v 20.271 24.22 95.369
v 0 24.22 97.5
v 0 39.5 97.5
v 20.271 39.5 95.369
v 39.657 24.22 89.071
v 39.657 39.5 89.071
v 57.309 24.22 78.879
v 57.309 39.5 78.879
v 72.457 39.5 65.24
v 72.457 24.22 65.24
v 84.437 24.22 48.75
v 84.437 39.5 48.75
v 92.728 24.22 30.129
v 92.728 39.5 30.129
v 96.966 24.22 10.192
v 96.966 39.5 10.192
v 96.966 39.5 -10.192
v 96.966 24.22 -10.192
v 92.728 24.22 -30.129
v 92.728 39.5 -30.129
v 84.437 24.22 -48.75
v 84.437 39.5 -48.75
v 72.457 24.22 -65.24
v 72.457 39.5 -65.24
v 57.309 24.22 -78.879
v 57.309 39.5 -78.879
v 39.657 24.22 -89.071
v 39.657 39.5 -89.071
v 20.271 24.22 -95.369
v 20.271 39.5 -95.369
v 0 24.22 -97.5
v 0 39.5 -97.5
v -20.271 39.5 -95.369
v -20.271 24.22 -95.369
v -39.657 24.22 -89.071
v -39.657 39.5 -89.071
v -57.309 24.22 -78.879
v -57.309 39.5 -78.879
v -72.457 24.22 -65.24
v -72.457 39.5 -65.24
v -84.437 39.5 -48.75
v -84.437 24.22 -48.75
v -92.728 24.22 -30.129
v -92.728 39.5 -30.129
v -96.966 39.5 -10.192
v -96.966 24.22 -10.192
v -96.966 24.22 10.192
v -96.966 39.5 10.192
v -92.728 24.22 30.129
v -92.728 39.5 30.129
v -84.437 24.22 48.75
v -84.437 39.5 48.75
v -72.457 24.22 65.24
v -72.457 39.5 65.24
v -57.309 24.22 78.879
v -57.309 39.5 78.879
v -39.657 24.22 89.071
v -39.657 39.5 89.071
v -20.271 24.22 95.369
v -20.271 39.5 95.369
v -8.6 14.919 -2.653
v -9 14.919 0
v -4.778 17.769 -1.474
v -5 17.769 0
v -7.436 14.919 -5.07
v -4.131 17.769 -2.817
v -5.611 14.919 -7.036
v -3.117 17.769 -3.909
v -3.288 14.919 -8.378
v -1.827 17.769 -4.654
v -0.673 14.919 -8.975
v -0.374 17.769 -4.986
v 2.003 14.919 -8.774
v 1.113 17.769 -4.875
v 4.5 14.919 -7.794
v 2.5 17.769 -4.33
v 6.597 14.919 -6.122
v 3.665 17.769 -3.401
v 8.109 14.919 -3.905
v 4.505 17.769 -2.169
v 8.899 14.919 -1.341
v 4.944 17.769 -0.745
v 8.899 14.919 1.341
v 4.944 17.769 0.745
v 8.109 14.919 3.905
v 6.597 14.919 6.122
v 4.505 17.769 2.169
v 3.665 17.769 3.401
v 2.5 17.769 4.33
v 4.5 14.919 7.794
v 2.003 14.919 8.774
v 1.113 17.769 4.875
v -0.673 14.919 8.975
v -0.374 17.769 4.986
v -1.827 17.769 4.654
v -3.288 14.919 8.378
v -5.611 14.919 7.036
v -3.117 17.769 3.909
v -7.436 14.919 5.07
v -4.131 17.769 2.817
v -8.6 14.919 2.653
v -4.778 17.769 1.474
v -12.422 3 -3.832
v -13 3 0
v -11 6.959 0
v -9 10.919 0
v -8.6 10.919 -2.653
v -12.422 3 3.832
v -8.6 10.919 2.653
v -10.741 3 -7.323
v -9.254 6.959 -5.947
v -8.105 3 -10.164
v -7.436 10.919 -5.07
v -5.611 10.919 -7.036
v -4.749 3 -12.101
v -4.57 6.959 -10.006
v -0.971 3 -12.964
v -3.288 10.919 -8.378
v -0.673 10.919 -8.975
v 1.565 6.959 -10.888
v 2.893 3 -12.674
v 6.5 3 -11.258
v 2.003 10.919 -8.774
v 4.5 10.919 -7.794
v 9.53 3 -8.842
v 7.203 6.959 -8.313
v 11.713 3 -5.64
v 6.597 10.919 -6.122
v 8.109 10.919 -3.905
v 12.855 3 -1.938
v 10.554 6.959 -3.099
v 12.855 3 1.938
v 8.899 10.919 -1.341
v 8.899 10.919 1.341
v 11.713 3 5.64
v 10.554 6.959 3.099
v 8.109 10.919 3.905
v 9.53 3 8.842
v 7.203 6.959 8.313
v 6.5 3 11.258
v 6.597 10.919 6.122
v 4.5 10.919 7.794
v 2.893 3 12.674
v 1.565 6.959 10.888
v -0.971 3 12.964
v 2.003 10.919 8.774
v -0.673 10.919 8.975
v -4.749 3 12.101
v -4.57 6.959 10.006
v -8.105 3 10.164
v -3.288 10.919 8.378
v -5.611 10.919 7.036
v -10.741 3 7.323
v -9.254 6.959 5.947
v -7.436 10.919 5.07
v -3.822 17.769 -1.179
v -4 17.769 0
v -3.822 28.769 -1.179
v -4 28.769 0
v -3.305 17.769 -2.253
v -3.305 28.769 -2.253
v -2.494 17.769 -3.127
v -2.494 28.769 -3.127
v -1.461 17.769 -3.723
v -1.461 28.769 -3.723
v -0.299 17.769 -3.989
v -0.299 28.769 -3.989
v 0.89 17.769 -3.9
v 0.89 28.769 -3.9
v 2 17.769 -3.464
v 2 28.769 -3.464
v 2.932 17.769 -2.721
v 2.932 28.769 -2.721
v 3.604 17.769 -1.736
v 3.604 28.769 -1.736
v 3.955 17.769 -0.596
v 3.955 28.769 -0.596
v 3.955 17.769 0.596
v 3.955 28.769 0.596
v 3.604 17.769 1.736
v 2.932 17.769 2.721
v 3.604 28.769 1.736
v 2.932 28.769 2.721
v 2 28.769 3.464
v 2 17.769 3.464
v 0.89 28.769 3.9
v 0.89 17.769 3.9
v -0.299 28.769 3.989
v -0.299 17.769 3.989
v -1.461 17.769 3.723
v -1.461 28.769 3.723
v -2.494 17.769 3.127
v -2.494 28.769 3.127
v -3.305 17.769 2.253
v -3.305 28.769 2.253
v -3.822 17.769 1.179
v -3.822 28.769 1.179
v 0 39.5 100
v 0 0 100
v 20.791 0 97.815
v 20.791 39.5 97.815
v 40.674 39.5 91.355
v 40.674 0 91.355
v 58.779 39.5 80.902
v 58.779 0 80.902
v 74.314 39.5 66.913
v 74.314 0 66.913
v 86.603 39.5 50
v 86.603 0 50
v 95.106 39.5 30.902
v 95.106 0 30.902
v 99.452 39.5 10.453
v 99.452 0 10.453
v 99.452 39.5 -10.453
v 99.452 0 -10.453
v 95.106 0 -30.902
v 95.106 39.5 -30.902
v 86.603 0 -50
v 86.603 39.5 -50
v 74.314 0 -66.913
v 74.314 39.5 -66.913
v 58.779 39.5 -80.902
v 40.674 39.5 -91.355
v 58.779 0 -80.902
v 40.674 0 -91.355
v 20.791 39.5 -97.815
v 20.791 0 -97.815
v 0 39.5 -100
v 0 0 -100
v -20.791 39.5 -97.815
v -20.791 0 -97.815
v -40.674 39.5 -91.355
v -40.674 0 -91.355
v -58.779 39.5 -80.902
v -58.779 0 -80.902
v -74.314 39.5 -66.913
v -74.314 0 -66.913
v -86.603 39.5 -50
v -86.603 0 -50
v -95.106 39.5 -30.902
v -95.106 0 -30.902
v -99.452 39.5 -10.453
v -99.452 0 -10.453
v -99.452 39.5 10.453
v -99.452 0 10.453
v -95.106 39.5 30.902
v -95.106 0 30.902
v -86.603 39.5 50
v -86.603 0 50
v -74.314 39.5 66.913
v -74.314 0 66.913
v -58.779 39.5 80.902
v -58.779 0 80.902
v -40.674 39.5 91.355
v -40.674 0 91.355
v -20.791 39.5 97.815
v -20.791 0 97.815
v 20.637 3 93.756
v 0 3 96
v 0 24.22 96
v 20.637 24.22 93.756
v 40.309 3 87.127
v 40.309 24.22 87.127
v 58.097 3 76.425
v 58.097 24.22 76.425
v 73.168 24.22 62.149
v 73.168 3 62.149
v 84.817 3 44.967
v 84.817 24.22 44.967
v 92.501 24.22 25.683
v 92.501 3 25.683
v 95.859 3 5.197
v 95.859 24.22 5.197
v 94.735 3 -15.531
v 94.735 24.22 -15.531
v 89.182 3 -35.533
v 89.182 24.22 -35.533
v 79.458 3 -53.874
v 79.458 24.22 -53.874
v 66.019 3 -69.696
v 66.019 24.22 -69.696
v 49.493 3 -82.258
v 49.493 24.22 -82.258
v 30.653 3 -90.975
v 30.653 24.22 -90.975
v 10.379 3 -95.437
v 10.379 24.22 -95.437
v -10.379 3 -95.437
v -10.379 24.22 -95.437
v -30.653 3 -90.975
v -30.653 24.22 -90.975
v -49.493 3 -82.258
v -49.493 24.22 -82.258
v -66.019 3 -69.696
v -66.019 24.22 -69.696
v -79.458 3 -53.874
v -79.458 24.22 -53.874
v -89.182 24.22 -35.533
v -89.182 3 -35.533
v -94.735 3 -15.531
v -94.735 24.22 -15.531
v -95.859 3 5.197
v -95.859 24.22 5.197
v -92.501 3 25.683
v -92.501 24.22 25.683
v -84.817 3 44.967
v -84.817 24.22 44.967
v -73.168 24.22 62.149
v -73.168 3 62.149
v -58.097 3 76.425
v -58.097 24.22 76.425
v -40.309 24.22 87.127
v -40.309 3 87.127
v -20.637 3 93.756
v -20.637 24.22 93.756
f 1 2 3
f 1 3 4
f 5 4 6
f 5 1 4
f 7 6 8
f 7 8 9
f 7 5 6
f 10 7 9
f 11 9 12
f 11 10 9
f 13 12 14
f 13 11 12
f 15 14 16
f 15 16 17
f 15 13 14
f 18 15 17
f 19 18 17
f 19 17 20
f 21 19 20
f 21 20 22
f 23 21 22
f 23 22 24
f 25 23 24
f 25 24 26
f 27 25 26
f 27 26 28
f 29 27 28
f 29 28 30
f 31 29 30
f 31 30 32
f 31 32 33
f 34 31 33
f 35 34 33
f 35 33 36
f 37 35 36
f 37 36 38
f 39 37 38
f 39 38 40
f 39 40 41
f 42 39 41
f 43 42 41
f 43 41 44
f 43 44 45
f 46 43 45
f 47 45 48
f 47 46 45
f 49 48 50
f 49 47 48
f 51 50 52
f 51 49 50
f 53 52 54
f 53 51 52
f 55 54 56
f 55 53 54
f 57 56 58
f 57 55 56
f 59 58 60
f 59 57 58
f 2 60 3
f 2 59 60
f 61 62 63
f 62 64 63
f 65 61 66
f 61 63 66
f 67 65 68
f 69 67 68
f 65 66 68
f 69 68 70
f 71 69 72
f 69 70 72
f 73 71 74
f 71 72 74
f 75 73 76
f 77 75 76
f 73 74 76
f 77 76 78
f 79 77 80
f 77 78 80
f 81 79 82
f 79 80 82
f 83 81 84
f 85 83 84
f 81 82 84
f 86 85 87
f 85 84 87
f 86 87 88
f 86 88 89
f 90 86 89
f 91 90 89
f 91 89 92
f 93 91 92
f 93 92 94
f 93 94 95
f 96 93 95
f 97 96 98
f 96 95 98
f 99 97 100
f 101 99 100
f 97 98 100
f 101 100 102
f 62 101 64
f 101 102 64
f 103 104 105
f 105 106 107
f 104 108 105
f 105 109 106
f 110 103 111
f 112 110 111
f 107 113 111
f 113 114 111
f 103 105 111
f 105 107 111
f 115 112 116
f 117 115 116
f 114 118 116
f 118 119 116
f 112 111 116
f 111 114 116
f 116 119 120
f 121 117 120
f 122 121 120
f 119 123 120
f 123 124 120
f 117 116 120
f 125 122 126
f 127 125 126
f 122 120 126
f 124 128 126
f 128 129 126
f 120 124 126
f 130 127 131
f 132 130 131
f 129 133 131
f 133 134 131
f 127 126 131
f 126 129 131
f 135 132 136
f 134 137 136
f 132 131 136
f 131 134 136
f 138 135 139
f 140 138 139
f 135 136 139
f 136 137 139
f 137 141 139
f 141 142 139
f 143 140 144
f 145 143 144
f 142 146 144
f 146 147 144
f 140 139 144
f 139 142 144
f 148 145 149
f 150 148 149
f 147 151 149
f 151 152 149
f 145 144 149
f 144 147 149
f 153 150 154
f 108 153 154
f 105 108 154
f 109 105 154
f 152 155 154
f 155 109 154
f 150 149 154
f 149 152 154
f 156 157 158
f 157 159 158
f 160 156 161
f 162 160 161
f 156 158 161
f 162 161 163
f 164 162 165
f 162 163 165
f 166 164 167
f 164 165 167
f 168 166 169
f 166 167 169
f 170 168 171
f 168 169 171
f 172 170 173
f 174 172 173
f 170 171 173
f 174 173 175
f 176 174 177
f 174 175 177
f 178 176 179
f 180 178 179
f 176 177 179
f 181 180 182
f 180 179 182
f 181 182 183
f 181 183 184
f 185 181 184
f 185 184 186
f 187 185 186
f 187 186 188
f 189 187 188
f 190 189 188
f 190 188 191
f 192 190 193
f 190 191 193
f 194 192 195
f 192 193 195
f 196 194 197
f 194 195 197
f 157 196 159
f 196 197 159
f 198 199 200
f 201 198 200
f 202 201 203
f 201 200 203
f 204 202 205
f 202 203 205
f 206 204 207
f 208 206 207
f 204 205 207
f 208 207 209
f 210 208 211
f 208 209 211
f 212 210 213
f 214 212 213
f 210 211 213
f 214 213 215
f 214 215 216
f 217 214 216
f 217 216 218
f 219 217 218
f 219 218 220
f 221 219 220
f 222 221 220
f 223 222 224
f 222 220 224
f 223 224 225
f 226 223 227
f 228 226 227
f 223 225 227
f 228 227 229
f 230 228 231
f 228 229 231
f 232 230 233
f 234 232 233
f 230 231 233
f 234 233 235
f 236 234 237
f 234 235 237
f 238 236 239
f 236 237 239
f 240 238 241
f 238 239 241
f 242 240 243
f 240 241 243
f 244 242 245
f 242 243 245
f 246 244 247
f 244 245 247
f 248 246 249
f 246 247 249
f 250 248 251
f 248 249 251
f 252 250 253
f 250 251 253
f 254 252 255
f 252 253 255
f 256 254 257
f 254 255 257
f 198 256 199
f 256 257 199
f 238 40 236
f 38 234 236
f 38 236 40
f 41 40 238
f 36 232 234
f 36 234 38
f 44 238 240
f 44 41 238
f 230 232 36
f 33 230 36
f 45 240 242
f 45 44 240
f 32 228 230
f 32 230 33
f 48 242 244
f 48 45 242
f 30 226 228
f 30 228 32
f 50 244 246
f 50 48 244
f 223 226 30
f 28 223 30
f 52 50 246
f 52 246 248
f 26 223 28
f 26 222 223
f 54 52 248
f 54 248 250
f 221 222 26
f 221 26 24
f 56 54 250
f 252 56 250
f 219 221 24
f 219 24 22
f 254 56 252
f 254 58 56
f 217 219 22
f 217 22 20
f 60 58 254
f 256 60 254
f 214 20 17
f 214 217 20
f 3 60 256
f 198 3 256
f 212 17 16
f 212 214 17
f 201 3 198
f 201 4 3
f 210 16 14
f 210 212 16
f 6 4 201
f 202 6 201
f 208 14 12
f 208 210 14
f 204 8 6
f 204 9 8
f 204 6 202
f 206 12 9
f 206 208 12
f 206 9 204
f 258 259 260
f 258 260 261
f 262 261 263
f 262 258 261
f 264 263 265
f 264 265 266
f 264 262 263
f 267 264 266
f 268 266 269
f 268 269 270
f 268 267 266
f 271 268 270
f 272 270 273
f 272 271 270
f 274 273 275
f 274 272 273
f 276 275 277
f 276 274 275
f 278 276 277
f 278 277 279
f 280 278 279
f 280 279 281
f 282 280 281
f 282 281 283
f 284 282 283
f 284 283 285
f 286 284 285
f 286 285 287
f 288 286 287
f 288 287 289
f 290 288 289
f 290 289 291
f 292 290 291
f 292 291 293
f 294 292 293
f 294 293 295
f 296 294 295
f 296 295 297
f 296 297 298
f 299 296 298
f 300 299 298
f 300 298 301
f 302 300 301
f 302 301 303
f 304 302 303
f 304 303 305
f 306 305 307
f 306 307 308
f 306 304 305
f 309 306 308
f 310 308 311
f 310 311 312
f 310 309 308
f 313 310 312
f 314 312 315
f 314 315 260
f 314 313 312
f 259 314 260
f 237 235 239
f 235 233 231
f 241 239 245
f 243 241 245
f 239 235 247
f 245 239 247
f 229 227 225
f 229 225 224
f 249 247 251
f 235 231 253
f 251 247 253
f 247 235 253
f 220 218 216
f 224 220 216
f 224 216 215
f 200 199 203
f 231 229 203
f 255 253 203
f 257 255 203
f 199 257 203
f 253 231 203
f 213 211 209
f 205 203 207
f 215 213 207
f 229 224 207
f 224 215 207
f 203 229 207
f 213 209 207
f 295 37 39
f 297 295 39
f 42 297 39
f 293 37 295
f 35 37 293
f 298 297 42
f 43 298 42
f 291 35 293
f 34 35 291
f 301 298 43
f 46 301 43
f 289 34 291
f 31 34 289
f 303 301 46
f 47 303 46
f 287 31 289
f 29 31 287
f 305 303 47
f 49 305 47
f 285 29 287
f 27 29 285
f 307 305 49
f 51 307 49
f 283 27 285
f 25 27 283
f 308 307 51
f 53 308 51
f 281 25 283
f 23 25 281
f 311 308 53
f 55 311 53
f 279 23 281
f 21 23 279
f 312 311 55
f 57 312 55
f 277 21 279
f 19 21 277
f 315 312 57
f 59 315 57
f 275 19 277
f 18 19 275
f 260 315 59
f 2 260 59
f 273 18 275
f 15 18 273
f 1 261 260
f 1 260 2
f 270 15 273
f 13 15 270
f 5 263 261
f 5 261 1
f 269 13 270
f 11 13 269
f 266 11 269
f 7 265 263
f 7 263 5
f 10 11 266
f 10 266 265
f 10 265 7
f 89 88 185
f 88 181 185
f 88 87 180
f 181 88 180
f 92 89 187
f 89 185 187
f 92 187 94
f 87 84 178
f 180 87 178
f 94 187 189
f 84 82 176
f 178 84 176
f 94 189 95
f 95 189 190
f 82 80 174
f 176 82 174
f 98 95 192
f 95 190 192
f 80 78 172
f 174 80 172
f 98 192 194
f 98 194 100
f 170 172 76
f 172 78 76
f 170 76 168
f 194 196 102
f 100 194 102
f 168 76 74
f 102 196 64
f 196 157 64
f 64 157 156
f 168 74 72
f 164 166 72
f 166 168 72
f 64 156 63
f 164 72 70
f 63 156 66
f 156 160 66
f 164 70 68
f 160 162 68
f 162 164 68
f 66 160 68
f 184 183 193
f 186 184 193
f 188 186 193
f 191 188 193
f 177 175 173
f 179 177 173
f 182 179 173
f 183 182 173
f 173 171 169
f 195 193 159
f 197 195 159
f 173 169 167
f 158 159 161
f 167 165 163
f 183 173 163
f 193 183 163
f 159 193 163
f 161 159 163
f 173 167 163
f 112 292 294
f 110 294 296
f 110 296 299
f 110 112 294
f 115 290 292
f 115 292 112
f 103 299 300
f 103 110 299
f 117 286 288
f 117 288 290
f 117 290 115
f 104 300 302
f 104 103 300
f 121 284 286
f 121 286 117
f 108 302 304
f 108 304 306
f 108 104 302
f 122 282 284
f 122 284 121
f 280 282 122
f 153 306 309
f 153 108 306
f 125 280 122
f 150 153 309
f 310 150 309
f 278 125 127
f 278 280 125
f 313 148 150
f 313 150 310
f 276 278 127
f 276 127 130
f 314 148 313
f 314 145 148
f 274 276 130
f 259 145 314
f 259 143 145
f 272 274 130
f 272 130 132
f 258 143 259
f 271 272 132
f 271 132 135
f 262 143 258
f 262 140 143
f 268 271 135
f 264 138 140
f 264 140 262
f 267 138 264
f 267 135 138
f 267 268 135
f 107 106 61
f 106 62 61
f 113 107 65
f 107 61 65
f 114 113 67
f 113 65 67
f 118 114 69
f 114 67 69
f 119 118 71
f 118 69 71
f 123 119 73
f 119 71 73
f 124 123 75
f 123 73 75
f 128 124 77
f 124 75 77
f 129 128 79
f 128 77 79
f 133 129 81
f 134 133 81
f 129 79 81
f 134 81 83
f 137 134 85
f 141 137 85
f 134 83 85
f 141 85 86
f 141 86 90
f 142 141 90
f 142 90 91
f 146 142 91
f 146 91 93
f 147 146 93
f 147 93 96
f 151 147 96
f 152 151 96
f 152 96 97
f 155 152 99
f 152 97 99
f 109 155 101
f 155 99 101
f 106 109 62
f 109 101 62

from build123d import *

# Parameters (mm, degrees)
SKETCH1_R           = 96
BOSS_EXTRUDE1_DEPTH = 3
SKETCH1_4_R         = 97.5
SKETCH1_4_R_2       = 96
BOSS_EXTRUDE2_DEPTH = 24.22
SKETCH1_5_R         = 100
SKETCH1_5_R_2       = 97.5
BOSS_EXTRUDE3_DEPTH = 39.5


with BuildPart() as part:
    # Sketch1 → Boss-Extrude1 (new body)
    with BuildSketch(Plane(origin=(0, 0, 0), x_dir=(1, 0, 0), z_dir=(0, 1, 0))):
        Circle(SKETCH1_R)
    extrude(amount=BOSS_EXTRUDE1_DEPTH)

    # Sketch1<4> → Boss-Extrude2 (add)
    with BuildSketch(Plane(origin=(0, 0, 0), x_dir=(1, 0, 0), z_dir=(0, 1, 0))):
        Circle(SKETCH1_4_R)
        Circle(SKETCH1_4_R_2, mode=Mode.SUBTRACT)
    extrude(amount=BOSS_EXTRUDE2_DEPTH)

    # Sketch1<5> → Boss-Extrude3 (add)
    with BuildSketch(Plane(origin=(0, 0, 0), x_dir=(1, 0, 0), z_dir=(0, 1, 0))):
        Circle(SKETCH1_5_R)
        Circle(SKETCH1_5_R_2, mode=Mode.SUBTRACT)
    extrude(amount=BOSS_EXTRUDE3_DEPTH)

    # Sketch6 → Revolve1 (revolve)
    with BuildSketch(Plane(origin=(0, 3, 0), x_dir=(1, 0, 0), z_dir=(0, 0, 1))):
        Polygon((0, 0), (-13, 0), (-9, 7.918840006), (-9, 11.918840006), (-5, 14.768523744), (-4, 14.768523744), (-4, 25.768523744), (0, 25.768523744), align=None)
    revolve(axis=Axis((0, 32.411214842, 0), (0, -1, 0)))


solid = part.part
